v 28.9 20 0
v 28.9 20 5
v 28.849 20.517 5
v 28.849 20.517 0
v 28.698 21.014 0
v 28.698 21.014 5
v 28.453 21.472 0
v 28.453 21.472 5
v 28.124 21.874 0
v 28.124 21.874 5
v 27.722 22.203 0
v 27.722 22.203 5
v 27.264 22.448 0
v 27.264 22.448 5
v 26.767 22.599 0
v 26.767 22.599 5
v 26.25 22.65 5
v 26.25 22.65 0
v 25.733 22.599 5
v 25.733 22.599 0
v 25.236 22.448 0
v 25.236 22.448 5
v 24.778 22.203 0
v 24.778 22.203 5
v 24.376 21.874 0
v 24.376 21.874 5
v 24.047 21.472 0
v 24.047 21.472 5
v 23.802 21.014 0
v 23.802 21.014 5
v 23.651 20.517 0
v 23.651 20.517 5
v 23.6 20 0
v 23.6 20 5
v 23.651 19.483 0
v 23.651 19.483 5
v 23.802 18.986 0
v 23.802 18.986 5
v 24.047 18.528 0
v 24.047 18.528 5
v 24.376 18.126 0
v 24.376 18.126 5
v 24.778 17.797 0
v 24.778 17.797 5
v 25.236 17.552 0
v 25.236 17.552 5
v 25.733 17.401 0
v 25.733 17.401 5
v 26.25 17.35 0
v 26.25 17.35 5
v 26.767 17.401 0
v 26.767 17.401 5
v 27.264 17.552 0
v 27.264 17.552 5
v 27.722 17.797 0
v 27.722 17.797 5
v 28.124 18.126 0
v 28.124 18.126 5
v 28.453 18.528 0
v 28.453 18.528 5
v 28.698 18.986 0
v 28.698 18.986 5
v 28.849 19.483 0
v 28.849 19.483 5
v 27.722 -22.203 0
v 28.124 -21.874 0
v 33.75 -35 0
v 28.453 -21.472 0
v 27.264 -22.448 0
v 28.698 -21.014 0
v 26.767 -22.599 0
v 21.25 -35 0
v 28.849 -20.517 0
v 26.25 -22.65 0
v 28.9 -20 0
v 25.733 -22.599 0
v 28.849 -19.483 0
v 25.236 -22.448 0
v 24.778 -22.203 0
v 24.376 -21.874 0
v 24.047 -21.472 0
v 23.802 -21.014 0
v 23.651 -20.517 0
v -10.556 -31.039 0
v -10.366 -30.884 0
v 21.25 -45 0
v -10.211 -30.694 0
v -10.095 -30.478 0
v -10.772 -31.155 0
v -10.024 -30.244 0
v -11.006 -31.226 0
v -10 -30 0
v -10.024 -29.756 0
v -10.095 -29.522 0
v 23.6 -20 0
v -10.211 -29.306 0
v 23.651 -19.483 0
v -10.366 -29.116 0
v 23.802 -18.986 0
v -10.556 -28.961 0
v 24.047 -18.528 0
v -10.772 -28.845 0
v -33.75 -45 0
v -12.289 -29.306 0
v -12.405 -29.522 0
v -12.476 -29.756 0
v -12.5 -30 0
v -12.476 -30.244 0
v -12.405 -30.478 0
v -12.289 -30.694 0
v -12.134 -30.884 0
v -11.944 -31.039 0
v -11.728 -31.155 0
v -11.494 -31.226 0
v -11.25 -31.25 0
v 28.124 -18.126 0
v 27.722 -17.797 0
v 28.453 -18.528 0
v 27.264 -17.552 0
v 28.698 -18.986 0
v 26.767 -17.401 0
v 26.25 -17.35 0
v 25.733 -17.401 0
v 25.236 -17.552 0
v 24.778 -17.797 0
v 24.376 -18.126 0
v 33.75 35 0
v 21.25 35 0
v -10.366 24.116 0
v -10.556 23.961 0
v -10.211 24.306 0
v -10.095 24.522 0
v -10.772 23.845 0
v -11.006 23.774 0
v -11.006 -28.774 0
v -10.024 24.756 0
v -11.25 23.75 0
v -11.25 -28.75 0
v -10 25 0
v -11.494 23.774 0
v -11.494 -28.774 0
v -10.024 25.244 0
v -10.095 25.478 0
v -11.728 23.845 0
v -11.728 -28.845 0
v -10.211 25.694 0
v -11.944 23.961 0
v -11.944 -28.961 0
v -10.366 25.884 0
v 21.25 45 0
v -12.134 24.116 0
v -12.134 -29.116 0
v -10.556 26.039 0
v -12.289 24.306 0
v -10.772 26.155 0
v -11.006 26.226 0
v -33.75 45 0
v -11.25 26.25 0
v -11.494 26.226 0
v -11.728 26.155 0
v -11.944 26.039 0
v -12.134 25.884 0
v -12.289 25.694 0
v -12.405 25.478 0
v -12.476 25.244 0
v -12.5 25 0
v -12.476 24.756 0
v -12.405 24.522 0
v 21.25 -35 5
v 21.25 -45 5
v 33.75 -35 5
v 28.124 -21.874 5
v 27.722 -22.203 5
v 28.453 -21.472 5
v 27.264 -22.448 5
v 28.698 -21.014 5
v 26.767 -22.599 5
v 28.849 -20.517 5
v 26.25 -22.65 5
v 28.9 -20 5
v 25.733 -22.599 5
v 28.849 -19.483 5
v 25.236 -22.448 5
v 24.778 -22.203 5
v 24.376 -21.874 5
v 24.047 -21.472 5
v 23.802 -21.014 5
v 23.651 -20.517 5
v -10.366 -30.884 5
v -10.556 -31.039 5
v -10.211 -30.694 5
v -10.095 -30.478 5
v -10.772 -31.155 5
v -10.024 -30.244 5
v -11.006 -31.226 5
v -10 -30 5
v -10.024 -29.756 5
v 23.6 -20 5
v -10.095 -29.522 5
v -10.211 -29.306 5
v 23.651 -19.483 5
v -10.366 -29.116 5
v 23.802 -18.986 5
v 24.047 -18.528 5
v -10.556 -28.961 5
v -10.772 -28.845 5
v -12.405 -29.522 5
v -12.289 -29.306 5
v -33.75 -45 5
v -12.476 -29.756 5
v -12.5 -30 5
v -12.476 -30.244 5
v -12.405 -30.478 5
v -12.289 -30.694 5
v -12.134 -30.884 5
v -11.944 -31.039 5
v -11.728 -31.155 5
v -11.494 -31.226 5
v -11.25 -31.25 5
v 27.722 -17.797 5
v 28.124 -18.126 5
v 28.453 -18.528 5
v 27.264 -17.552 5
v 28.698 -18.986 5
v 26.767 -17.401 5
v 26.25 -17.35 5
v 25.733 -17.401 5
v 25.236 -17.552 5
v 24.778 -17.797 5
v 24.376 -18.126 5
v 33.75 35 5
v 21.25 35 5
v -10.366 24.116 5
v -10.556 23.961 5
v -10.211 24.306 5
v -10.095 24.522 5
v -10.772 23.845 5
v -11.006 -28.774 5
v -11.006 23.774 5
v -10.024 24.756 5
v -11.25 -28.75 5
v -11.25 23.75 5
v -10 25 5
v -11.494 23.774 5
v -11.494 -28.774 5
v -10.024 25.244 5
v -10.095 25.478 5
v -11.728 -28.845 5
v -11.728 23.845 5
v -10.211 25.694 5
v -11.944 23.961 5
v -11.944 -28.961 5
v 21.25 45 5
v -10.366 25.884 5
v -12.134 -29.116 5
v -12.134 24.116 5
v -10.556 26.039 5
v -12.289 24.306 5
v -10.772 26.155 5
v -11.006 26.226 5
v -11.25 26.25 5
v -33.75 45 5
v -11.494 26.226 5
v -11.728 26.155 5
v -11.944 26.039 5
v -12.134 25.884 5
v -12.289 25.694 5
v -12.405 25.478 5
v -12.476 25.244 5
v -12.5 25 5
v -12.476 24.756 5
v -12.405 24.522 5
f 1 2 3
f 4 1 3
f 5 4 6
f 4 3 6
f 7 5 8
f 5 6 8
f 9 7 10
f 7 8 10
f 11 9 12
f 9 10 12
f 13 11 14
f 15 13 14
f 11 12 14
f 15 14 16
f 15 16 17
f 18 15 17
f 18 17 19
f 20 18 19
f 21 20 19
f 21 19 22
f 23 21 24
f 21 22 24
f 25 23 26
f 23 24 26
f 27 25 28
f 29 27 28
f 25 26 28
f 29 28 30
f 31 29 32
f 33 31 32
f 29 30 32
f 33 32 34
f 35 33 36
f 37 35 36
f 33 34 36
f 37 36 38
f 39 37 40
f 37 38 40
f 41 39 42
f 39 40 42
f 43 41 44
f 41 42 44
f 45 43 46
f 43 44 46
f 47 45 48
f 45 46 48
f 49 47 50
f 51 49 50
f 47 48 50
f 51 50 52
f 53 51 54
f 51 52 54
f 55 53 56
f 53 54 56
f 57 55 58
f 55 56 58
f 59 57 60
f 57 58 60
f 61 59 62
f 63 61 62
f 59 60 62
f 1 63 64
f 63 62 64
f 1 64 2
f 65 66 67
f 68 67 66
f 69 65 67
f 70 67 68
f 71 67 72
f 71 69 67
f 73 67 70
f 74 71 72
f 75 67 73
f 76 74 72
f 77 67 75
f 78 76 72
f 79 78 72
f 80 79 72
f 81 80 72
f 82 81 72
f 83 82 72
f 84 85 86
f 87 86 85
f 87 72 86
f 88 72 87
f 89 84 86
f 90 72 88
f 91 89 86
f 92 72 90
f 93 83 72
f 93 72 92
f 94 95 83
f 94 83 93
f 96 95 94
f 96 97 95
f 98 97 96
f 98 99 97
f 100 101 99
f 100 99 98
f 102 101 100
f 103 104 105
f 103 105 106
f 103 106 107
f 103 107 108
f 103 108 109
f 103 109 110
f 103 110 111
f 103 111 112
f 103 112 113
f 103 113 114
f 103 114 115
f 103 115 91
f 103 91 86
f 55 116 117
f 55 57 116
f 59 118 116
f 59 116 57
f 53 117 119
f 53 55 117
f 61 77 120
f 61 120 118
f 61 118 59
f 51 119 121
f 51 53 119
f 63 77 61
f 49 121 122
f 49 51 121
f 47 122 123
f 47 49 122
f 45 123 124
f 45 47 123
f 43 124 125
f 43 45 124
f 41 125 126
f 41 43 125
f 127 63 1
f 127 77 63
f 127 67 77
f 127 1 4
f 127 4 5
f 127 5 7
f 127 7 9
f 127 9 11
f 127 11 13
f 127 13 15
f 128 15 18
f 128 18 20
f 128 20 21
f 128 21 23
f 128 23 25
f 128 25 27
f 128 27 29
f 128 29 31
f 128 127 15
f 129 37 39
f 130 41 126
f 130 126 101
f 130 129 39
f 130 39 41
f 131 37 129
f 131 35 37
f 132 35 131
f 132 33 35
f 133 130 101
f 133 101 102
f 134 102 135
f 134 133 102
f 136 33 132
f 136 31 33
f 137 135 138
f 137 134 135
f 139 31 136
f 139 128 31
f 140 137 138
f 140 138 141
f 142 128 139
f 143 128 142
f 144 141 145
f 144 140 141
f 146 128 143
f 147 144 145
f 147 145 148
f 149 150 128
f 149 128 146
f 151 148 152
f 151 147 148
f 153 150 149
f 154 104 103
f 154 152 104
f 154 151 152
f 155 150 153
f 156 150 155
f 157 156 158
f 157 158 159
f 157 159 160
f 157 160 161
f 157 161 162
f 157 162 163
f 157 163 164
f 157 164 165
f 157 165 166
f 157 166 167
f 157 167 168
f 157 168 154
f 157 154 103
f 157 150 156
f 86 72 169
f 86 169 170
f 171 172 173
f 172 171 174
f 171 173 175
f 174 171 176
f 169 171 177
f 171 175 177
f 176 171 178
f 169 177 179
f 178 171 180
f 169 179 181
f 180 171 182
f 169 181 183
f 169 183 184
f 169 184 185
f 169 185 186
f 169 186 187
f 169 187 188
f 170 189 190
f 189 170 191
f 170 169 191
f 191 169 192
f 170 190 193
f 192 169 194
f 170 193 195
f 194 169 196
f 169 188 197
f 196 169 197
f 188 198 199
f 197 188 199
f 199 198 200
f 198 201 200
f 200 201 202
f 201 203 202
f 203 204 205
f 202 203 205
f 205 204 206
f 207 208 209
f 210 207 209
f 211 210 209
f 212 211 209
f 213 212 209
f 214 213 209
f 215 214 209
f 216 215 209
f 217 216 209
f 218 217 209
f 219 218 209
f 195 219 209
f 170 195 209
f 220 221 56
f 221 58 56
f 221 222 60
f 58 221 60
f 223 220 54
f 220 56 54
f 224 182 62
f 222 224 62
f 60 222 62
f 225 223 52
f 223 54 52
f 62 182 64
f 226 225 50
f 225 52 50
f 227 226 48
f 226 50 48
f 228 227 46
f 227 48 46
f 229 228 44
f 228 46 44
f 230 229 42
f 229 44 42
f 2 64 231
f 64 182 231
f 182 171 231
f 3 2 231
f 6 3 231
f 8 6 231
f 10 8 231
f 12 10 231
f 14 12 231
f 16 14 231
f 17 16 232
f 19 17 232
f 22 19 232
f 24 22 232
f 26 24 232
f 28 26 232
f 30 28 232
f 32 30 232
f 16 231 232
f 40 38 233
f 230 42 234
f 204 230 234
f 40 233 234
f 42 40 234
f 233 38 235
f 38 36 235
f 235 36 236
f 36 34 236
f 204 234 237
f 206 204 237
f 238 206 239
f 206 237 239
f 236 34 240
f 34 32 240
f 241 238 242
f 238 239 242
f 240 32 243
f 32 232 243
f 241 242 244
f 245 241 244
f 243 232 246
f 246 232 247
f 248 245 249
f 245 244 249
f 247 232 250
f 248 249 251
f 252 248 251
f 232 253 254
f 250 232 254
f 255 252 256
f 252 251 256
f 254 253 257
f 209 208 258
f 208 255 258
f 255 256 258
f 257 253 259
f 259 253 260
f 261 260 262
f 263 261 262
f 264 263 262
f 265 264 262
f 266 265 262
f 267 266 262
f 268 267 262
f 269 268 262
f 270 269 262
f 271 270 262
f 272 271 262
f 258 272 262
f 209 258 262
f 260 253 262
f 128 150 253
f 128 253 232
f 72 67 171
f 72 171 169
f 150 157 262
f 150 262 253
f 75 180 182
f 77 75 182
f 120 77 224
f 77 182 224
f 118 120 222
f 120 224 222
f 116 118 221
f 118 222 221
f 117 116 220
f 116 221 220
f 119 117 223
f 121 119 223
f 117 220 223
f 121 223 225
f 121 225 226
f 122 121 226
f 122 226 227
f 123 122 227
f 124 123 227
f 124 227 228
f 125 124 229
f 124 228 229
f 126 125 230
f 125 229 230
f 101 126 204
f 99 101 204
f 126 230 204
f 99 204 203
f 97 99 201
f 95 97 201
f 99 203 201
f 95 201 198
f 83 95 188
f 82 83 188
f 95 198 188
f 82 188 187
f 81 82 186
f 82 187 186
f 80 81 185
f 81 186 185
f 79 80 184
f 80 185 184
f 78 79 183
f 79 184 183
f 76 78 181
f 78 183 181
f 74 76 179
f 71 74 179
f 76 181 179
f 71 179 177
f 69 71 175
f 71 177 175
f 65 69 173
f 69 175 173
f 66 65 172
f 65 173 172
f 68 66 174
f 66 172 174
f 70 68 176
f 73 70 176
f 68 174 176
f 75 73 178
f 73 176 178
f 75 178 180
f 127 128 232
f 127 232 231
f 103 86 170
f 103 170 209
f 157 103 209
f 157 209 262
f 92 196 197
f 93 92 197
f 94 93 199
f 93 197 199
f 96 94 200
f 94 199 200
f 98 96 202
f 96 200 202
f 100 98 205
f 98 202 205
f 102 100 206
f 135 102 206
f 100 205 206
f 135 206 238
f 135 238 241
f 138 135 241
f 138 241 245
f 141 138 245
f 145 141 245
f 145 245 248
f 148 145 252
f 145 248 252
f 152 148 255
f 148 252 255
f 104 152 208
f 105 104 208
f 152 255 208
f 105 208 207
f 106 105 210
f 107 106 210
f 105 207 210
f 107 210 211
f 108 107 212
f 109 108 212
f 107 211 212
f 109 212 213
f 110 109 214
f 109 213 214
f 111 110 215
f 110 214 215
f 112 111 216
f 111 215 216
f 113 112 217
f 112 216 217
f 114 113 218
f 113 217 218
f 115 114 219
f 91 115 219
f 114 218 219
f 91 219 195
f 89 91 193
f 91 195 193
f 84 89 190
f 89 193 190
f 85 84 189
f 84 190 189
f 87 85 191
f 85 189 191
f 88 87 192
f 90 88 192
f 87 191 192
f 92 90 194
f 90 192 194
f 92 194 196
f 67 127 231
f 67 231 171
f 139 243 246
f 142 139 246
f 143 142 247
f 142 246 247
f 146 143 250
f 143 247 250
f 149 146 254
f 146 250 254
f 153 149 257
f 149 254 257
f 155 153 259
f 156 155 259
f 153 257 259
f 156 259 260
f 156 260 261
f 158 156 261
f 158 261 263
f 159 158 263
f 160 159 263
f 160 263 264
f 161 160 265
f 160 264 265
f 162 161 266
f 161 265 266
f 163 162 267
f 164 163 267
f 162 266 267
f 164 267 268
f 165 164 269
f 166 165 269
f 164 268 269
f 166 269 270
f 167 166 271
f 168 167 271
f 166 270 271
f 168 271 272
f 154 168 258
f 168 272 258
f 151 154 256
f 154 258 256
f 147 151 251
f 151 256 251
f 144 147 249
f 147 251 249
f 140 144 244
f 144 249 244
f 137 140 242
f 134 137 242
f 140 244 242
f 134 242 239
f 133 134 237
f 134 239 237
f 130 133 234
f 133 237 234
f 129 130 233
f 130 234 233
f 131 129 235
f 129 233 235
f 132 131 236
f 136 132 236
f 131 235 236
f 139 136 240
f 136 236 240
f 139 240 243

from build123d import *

# Parameters (mm, degrees)
PAD_DEPTH       = 5
SKETCH001_R     = 1.25
POCKET_DEPTH    = 5
SKETCH002_R     = 2.65
POCKET001_DEPTH = 5


with BuildPart() as part:
    # Sketch → Pad (new body)
    with BuildSketch(Plane.XY):
        Polygon((-33.75, -45), (-33.75, 45), (21.25, 45), (21.25, 35), (33.75, 35), (33.75, -35), (21.25, -35), (21.25, -45), align=None)
    extrude(amount=PAD_DEPTH)

    # Sketch001 (on Face10 of Pad) → Pocket (cut)
    with BuildSketch(Plane.XY.offset(5)):
        with Locations((-11.25, 25)):
            Circle(SKETCH001_R)
        with Locations((-11.25, -30)):
            Circle(SKETCH001_R)
    extrude(amount=-POCKET_DEPTH, mode=Mode.SUBTRACT)

    # Sketch002 (on Face5 of Pocket) → Pocket001 (cut)
    with BuildSketch(Plane.XY.offset(5)):
        with Locations((26.25, 20)):
            Circle(SKETCH002_R)
        with Locations((26.25, -20)):
            Circle(SKETCH002_R)
    extrude(amount=-POCKET001_DEPTH, mode=Mode.SUBTRACT)


solid = part.part
